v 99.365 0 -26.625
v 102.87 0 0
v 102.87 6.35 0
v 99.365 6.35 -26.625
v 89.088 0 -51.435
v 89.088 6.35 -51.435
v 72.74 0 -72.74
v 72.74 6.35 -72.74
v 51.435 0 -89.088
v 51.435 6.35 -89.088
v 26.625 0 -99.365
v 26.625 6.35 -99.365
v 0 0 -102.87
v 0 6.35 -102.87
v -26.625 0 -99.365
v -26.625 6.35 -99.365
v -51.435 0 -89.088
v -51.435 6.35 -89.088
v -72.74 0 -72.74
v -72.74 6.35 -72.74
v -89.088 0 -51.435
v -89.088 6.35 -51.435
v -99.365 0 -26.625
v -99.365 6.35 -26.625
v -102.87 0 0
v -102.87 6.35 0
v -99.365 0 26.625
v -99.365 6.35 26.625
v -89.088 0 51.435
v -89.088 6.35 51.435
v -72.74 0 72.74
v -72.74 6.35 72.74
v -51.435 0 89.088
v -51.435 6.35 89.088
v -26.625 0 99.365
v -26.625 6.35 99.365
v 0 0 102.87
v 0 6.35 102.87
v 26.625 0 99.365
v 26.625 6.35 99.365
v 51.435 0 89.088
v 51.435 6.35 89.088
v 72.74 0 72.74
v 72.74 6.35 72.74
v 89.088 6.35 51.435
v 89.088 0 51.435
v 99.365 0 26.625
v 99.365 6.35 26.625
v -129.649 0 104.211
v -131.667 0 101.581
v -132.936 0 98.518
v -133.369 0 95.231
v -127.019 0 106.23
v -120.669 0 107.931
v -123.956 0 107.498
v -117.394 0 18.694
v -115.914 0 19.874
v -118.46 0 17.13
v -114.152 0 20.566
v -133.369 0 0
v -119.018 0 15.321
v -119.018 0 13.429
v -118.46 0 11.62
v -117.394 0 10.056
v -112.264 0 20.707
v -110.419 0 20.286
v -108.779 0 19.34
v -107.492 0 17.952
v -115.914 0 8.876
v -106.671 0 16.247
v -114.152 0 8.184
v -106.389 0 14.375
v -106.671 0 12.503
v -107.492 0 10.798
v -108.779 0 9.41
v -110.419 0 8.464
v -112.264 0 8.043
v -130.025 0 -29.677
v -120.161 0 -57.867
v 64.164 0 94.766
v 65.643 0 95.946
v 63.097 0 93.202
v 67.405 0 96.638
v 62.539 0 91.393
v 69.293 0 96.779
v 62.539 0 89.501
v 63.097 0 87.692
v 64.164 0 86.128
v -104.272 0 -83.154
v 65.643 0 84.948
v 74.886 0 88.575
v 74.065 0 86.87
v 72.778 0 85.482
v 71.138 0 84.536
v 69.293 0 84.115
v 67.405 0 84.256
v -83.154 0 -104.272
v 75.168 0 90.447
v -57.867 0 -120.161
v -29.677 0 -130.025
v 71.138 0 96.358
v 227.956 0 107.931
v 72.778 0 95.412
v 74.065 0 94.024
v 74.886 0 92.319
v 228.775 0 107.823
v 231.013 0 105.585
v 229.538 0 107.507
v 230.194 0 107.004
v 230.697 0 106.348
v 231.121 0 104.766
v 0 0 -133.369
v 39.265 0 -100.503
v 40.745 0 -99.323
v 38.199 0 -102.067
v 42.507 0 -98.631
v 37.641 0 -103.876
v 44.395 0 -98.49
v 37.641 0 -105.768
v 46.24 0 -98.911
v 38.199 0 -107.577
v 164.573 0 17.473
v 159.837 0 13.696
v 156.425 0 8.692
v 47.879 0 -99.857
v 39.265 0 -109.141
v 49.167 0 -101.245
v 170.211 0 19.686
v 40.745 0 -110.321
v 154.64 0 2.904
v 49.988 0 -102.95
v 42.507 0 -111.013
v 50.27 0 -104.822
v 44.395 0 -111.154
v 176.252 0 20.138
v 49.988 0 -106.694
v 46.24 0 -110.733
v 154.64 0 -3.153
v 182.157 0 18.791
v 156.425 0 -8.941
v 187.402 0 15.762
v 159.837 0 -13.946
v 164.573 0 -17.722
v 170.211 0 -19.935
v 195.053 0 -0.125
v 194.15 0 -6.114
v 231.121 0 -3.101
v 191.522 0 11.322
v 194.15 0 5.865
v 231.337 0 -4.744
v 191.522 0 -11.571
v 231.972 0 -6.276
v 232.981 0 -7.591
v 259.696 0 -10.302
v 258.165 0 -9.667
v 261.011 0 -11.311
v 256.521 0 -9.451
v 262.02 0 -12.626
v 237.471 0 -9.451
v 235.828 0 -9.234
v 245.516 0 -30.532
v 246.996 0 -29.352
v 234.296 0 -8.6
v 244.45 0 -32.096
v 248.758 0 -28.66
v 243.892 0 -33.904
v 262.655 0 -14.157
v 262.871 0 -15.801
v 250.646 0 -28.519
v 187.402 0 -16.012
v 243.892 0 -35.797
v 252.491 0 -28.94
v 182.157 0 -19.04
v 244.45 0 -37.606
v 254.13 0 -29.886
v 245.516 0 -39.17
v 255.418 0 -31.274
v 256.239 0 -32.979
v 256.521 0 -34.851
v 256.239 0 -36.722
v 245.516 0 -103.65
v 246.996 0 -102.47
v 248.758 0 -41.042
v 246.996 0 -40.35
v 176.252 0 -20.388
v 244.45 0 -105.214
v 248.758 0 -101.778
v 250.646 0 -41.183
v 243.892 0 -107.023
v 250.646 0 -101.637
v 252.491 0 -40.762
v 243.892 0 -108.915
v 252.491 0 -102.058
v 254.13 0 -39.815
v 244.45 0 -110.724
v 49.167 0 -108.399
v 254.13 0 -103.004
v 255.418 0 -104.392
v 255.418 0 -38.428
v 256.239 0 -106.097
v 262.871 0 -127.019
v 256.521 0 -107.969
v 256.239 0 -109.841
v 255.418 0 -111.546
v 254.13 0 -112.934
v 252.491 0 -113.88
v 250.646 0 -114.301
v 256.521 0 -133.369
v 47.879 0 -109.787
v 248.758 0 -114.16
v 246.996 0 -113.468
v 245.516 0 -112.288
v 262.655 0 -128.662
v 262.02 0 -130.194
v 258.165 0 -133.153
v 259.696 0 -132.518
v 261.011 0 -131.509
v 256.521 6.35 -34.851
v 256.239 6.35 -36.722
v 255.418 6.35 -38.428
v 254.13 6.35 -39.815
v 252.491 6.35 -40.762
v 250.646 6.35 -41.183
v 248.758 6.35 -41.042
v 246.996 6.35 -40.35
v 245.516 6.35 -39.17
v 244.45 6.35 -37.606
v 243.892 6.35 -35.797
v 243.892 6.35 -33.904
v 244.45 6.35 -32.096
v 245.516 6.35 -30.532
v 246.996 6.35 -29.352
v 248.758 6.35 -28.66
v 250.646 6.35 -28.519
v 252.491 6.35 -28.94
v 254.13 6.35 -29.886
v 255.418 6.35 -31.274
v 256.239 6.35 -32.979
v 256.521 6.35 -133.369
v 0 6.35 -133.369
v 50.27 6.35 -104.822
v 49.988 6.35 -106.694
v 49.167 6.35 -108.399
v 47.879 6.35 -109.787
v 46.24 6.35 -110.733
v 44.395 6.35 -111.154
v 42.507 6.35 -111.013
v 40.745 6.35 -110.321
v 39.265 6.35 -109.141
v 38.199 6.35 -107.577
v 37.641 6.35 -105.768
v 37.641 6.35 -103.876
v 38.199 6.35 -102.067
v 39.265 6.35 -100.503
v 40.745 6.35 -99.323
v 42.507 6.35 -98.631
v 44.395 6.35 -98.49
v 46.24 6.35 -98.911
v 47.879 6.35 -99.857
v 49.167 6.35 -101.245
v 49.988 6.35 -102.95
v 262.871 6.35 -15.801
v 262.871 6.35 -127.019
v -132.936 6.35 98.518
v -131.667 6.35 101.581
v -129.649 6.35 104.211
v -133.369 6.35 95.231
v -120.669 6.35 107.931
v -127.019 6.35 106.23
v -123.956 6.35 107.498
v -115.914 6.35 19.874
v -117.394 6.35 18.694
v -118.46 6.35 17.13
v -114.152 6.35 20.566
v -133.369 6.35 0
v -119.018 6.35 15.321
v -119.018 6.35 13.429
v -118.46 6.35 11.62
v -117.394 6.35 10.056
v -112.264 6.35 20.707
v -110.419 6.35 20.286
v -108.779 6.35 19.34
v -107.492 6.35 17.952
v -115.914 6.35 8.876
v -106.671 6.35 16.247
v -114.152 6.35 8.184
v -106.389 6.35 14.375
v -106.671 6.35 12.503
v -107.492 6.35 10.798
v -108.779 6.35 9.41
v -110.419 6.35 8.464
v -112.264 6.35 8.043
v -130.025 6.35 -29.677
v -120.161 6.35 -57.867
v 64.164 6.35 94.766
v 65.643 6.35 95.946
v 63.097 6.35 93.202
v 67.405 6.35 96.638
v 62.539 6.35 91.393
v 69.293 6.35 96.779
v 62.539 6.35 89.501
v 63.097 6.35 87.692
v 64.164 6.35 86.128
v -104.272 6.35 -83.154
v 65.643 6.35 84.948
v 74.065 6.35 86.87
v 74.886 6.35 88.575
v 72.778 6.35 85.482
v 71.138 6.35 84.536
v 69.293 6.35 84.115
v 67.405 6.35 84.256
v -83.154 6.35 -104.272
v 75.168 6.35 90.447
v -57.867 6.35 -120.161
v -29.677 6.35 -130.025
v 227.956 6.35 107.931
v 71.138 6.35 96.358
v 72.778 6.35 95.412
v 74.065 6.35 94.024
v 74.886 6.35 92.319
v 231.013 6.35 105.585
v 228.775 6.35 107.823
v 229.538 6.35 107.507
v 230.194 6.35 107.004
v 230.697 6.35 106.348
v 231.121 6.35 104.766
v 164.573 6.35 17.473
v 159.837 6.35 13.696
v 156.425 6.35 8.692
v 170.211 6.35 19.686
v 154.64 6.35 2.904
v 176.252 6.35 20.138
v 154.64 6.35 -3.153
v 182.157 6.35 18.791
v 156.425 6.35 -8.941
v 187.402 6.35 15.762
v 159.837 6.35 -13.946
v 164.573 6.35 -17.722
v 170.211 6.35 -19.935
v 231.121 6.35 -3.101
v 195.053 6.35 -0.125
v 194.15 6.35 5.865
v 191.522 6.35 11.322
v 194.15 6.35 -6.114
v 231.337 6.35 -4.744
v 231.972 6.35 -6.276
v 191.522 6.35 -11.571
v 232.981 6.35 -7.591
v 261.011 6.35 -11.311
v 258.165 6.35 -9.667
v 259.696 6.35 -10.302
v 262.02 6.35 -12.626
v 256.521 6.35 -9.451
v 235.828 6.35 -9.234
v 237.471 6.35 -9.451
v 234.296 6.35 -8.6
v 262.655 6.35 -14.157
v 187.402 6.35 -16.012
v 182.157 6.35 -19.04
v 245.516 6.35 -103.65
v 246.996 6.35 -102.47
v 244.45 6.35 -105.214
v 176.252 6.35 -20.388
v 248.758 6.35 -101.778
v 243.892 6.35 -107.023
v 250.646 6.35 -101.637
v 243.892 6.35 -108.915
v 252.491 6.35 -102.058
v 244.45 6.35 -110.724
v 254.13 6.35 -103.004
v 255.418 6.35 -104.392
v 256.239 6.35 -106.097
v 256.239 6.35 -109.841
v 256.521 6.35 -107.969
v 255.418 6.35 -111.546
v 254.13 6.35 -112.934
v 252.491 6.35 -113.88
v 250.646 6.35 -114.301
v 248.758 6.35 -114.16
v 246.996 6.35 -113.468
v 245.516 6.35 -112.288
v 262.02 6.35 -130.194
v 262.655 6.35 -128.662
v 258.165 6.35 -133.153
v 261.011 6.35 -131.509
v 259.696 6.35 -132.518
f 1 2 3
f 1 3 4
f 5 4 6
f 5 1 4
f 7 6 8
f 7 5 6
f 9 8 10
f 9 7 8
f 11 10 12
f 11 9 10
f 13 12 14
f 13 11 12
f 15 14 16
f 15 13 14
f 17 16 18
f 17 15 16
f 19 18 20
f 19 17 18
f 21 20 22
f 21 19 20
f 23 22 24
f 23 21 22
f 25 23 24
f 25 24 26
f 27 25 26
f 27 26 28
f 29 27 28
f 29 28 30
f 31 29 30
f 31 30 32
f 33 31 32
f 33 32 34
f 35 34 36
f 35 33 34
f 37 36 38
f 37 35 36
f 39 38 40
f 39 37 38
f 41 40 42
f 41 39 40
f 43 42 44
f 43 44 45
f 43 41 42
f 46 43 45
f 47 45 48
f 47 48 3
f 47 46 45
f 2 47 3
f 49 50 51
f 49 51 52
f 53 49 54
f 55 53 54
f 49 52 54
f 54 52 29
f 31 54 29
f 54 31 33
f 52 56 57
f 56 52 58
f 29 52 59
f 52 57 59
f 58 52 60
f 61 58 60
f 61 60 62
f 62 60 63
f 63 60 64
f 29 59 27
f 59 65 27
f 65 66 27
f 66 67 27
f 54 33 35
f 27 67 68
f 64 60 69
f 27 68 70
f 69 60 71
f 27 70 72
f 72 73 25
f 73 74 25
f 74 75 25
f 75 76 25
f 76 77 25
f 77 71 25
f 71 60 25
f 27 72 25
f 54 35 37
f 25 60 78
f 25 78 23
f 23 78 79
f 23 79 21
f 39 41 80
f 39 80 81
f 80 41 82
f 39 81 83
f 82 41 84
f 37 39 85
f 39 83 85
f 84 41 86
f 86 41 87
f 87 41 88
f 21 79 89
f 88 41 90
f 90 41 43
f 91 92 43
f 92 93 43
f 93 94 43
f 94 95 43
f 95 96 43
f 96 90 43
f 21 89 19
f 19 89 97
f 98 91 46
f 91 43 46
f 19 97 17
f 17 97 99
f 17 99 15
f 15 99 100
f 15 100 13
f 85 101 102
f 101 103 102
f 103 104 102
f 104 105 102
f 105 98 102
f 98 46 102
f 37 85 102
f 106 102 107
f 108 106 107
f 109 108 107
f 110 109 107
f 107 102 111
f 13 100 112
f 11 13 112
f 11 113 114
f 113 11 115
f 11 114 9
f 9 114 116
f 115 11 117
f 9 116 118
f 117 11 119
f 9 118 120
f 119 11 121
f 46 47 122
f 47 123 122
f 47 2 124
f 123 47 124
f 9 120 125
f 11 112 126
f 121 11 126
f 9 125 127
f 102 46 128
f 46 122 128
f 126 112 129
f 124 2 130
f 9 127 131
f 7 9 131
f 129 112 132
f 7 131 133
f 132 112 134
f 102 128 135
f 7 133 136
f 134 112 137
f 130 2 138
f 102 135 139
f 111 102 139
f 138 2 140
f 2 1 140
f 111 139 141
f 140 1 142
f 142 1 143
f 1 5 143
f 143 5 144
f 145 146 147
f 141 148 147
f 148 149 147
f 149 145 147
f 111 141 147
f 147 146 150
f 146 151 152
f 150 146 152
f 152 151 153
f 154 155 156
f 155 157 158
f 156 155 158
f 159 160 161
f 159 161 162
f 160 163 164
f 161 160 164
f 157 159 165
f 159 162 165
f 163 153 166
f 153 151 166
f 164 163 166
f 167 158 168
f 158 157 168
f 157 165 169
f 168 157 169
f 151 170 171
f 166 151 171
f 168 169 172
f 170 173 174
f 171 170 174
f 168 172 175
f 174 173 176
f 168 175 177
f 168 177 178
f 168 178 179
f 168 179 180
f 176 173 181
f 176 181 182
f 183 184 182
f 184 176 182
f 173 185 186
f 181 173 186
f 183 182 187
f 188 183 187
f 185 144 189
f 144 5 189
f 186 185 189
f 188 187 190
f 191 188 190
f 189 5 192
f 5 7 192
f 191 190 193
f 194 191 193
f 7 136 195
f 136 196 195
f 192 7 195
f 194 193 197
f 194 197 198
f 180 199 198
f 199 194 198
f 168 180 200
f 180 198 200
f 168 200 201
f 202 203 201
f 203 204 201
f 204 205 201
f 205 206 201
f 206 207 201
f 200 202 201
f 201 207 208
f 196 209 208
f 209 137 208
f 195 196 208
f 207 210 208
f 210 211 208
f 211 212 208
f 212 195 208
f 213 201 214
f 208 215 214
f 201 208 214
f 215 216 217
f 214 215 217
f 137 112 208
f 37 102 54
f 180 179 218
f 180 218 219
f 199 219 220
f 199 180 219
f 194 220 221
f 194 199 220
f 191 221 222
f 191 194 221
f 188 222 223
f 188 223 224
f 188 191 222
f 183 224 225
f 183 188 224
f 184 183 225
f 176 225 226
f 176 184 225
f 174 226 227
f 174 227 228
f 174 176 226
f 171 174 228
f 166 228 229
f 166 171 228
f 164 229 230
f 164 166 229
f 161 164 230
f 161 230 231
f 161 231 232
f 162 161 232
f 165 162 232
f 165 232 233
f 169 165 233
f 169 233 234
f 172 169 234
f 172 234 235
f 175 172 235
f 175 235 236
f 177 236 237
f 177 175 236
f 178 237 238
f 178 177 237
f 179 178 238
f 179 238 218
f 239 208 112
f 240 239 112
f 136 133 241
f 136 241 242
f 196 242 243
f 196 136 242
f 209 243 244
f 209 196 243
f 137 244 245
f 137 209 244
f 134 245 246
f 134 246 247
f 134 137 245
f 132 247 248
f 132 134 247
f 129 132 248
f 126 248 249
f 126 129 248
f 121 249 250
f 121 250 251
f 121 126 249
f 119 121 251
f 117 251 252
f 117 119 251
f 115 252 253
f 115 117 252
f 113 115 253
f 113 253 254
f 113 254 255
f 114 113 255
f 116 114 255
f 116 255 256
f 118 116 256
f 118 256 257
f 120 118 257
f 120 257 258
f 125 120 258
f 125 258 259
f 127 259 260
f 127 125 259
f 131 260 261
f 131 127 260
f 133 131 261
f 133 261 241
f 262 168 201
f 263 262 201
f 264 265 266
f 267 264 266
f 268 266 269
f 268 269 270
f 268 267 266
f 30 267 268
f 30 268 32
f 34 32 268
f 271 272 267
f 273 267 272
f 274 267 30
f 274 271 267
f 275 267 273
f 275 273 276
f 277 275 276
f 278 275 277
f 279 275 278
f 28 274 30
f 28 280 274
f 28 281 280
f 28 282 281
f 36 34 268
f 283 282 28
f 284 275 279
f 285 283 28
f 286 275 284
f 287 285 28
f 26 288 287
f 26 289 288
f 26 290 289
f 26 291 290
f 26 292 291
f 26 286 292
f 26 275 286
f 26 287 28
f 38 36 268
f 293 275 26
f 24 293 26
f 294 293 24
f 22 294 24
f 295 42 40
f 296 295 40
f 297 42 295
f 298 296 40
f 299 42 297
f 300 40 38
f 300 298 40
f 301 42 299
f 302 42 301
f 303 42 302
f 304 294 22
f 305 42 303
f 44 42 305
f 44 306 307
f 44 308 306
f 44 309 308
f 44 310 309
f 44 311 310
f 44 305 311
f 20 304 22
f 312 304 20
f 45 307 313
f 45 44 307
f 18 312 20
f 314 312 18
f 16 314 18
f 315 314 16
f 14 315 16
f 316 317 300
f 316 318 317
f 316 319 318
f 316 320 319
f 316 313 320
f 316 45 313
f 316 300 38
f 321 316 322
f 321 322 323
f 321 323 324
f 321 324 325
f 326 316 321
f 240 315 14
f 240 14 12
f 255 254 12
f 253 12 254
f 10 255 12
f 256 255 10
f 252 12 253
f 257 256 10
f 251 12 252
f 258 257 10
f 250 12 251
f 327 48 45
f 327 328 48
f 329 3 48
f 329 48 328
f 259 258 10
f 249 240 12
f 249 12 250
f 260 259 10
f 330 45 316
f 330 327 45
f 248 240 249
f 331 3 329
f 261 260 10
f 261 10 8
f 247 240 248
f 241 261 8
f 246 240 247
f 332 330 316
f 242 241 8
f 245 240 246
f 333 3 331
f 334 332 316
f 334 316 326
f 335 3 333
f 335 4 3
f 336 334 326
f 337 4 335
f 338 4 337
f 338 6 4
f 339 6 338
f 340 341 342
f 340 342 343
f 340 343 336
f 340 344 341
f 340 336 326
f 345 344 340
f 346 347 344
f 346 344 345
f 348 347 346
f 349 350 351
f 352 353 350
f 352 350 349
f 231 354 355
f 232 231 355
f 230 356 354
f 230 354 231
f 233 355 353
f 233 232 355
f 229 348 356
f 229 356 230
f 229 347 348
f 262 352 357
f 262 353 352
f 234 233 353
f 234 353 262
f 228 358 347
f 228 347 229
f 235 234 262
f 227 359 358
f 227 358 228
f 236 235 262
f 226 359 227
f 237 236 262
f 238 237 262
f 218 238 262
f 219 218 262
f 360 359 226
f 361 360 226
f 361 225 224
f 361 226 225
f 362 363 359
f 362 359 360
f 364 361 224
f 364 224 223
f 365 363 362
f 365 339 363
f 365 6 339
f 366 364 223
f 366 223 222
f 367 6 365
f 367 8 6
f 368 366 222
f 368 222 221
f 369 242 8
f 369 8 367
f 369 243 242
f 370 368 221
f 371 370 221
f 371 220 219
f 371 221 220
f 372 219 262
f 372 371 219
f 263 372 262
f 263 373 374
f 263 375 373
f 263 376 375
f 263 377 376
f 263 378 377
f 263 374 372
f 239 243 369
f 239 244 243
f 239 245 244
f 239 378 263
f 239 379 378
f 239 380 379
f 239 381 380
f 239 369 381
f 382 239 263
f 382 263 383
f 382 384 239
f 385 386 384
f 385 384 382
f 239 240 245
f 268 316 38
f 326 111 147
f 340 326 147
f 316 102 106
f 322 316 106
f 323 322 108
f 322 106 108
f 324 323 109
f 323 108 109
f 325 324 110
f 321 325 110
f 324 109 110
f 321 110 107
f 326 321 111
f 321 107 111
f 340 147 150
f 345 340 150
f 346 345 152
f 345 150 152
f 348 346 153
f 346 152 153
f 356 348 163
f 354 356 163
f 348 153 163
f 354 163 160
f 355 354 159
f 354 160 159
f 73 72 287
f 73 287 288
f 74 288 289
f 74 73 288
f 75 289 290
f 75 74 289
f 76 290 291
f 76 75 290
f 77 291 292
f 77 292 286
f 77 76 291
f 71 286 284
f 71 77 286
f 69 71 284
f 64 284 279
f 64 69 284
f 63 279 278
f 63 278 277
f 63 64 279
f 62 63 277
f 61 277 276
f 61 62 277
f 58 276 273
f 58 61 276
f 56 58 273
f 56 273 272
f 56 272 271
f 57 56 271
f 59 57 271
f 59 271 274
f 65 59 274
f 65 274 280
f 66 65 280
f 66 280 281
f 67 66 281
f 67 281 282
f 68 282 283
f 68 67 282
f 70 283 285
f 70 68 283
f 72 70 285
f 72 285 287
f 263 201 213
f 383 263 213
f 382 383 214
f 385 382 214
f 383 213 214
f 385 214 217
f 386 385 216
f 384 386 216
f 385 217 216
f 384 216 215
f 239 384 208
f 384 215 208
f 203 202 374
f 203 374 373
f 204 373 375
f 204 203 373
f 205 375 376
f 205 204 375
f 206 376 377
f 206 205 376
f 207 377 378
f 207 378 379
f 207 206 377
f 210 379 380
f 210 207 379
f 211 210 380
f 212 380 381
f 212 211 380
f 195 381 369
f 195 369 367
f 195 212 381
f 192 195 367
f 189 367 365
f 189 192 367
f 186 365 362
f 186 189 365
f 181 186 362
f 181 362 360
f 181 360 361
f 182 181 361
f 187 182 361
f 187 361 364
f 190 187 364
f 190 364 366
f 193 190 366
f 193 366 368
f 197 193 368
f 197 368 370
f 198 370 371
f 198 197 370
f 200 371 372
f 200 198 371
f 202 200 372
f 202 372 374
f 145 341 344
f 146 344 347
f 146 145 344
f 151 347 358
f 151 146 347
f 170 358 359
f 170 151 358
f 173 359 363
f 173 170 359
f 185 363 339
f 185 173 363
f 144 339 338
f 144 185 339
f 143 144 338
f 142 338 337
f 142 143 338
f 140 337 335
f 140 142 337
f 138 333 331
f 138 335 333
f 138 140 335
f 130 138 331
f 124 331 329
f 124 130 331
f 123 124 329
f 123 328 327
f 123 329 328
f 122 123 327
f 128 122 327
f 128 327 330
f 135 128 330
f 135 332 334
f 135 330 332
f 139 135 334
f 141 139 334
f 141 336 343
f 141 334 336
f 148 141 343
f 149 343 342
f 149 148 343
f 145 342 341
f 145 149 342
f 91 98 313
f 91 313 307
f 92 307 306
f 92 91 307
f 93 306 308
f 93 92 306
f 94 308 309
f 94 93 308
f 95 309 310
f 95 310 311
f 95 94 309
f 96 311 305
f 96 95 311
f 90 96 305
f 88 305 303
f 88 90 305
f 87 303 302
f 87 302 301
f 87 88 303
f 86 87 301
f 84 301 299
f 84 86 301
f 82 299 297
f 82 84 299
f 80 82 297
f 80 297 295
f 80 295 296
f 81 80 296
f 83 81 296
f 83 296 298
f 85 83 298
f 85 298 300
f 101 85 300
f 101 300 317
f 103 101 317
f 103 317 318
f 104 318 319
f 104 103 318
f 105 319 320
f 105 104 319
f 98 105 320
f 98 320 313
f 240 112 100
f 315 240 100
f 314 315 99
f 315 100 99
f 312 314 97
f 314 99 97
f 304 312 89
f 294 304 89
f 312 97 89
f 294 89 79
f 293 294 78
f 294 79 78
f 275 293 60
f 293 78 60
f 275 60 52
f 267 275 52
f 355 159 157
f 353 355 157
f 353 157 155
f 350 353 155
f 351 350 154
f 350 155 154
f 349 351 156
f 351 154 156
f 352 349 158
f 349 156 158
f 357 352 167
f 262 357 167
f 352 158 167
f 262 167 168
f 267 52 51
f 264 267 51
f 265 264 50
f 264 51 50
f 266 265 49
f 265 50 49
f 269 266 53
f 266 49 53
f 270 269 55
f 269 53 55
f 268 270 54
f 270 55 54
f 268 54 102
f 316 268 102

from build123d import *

# Parameters (mm, degrees)
SKETCH1_R           = 102.87
SKETCH1_R_2         = 6.35
BOSS_EXTRUDE1_DEPTH = 6.35
SKETCH6_R           = 20.32
CUT_EXTRUDE1_DEPTH  = 28.448


with BuildPart() as part:
    # Sketch1 → Boss-Extrude1 (new body)
    with BuildSketch(Plane(origin=(0, 0, 0), x_dir=(1, 0, 0), z_dir=(0, 1, 0))):
        with BuildLine():
            Line((256.521079071, 133.368920929), (0, 133.368920929))
            ThreePointArc((0, 133.368920929), (-94.306068389, 94.306068389), (-133.368920929, 0))
            Line((-133.368920929, 0), (-133.368920929, -95.231079071))
            ThreePointArc((-133.368920929, -95.231079071), (-129.64917705, -104.211335192), (-120.668920929, -107.931079071))
            Line((-120.668920929, -107.931079071), (227.955539535, -107.931079071))
            ThreePointArc((227.955539535, -107.931079071), (230.193914007, -107.003914007), (231.121079071, -104.765539535))
            Line((231.121079071, -104.765539535), (231.121079071, 3.100777109))
            ThreePointArc((231.121079071, 3.100777109), (232.98095101, 7.59090517), (237.471079071, 9.450777109))
            Line((237.471079071, 9.450777109), (256.521079071, 9.450777109))
            ThreePointArc((256.521079071, 9.450777109), (261.011207131, 11.310649048), (262.871079071, 15.800777109))
            Line((262.871079071, 15.800777109), (262.871079071, 127.018920929))
            ThreePointArc((262.871079071, 127.018920929), (261.011207131, 131.50904899), (256.521079071, 133.368920929))
        make_face()
        Circle(SKETCH1_R, mode=Mode.SUBTRACT)
        with Locations((-112.738641363, -14.374963544)):
            Circle(SKETCH1_R_2, mode=Mode.SUBTRACT)
        with Locations((43.920237074, 104.822009181)):
            Circle(SKETCH1_R_2, mode=Mode.SUBTRACT)
        with Locations((68.818404289, -90.447045637)):
            Circle(SKETCH1_R_2, mode=Mode.SUBTRACT)
        with Locations((250.171079071, 107.968920929)):
            Circle(SKETCH1_R_2, mode=Mode.SUBTRACT)
        with Locations((250.171079071, 34.850777109)):
            Circle(SKETCH1_R_2, mode=Mode.SUBTRACT)
    extrude(amount=BOSS_EXTRUDE1_DEPTH)

    # Sketch6 → Cut-Extrude1 (cut)
    with BuildSketch(Plane(origin=(0, 0, 0), x_dir=(1, 0, 0), z_dir=(0, 1, 0))):
        with Locations((174.732998702, 0.124686489)):
            Circle(SKETCH6_R)
    extrude(amount=CUT_EXTRUDE1_DEPTH, mode=Mode.SUBTRACT)


solid = part.part
